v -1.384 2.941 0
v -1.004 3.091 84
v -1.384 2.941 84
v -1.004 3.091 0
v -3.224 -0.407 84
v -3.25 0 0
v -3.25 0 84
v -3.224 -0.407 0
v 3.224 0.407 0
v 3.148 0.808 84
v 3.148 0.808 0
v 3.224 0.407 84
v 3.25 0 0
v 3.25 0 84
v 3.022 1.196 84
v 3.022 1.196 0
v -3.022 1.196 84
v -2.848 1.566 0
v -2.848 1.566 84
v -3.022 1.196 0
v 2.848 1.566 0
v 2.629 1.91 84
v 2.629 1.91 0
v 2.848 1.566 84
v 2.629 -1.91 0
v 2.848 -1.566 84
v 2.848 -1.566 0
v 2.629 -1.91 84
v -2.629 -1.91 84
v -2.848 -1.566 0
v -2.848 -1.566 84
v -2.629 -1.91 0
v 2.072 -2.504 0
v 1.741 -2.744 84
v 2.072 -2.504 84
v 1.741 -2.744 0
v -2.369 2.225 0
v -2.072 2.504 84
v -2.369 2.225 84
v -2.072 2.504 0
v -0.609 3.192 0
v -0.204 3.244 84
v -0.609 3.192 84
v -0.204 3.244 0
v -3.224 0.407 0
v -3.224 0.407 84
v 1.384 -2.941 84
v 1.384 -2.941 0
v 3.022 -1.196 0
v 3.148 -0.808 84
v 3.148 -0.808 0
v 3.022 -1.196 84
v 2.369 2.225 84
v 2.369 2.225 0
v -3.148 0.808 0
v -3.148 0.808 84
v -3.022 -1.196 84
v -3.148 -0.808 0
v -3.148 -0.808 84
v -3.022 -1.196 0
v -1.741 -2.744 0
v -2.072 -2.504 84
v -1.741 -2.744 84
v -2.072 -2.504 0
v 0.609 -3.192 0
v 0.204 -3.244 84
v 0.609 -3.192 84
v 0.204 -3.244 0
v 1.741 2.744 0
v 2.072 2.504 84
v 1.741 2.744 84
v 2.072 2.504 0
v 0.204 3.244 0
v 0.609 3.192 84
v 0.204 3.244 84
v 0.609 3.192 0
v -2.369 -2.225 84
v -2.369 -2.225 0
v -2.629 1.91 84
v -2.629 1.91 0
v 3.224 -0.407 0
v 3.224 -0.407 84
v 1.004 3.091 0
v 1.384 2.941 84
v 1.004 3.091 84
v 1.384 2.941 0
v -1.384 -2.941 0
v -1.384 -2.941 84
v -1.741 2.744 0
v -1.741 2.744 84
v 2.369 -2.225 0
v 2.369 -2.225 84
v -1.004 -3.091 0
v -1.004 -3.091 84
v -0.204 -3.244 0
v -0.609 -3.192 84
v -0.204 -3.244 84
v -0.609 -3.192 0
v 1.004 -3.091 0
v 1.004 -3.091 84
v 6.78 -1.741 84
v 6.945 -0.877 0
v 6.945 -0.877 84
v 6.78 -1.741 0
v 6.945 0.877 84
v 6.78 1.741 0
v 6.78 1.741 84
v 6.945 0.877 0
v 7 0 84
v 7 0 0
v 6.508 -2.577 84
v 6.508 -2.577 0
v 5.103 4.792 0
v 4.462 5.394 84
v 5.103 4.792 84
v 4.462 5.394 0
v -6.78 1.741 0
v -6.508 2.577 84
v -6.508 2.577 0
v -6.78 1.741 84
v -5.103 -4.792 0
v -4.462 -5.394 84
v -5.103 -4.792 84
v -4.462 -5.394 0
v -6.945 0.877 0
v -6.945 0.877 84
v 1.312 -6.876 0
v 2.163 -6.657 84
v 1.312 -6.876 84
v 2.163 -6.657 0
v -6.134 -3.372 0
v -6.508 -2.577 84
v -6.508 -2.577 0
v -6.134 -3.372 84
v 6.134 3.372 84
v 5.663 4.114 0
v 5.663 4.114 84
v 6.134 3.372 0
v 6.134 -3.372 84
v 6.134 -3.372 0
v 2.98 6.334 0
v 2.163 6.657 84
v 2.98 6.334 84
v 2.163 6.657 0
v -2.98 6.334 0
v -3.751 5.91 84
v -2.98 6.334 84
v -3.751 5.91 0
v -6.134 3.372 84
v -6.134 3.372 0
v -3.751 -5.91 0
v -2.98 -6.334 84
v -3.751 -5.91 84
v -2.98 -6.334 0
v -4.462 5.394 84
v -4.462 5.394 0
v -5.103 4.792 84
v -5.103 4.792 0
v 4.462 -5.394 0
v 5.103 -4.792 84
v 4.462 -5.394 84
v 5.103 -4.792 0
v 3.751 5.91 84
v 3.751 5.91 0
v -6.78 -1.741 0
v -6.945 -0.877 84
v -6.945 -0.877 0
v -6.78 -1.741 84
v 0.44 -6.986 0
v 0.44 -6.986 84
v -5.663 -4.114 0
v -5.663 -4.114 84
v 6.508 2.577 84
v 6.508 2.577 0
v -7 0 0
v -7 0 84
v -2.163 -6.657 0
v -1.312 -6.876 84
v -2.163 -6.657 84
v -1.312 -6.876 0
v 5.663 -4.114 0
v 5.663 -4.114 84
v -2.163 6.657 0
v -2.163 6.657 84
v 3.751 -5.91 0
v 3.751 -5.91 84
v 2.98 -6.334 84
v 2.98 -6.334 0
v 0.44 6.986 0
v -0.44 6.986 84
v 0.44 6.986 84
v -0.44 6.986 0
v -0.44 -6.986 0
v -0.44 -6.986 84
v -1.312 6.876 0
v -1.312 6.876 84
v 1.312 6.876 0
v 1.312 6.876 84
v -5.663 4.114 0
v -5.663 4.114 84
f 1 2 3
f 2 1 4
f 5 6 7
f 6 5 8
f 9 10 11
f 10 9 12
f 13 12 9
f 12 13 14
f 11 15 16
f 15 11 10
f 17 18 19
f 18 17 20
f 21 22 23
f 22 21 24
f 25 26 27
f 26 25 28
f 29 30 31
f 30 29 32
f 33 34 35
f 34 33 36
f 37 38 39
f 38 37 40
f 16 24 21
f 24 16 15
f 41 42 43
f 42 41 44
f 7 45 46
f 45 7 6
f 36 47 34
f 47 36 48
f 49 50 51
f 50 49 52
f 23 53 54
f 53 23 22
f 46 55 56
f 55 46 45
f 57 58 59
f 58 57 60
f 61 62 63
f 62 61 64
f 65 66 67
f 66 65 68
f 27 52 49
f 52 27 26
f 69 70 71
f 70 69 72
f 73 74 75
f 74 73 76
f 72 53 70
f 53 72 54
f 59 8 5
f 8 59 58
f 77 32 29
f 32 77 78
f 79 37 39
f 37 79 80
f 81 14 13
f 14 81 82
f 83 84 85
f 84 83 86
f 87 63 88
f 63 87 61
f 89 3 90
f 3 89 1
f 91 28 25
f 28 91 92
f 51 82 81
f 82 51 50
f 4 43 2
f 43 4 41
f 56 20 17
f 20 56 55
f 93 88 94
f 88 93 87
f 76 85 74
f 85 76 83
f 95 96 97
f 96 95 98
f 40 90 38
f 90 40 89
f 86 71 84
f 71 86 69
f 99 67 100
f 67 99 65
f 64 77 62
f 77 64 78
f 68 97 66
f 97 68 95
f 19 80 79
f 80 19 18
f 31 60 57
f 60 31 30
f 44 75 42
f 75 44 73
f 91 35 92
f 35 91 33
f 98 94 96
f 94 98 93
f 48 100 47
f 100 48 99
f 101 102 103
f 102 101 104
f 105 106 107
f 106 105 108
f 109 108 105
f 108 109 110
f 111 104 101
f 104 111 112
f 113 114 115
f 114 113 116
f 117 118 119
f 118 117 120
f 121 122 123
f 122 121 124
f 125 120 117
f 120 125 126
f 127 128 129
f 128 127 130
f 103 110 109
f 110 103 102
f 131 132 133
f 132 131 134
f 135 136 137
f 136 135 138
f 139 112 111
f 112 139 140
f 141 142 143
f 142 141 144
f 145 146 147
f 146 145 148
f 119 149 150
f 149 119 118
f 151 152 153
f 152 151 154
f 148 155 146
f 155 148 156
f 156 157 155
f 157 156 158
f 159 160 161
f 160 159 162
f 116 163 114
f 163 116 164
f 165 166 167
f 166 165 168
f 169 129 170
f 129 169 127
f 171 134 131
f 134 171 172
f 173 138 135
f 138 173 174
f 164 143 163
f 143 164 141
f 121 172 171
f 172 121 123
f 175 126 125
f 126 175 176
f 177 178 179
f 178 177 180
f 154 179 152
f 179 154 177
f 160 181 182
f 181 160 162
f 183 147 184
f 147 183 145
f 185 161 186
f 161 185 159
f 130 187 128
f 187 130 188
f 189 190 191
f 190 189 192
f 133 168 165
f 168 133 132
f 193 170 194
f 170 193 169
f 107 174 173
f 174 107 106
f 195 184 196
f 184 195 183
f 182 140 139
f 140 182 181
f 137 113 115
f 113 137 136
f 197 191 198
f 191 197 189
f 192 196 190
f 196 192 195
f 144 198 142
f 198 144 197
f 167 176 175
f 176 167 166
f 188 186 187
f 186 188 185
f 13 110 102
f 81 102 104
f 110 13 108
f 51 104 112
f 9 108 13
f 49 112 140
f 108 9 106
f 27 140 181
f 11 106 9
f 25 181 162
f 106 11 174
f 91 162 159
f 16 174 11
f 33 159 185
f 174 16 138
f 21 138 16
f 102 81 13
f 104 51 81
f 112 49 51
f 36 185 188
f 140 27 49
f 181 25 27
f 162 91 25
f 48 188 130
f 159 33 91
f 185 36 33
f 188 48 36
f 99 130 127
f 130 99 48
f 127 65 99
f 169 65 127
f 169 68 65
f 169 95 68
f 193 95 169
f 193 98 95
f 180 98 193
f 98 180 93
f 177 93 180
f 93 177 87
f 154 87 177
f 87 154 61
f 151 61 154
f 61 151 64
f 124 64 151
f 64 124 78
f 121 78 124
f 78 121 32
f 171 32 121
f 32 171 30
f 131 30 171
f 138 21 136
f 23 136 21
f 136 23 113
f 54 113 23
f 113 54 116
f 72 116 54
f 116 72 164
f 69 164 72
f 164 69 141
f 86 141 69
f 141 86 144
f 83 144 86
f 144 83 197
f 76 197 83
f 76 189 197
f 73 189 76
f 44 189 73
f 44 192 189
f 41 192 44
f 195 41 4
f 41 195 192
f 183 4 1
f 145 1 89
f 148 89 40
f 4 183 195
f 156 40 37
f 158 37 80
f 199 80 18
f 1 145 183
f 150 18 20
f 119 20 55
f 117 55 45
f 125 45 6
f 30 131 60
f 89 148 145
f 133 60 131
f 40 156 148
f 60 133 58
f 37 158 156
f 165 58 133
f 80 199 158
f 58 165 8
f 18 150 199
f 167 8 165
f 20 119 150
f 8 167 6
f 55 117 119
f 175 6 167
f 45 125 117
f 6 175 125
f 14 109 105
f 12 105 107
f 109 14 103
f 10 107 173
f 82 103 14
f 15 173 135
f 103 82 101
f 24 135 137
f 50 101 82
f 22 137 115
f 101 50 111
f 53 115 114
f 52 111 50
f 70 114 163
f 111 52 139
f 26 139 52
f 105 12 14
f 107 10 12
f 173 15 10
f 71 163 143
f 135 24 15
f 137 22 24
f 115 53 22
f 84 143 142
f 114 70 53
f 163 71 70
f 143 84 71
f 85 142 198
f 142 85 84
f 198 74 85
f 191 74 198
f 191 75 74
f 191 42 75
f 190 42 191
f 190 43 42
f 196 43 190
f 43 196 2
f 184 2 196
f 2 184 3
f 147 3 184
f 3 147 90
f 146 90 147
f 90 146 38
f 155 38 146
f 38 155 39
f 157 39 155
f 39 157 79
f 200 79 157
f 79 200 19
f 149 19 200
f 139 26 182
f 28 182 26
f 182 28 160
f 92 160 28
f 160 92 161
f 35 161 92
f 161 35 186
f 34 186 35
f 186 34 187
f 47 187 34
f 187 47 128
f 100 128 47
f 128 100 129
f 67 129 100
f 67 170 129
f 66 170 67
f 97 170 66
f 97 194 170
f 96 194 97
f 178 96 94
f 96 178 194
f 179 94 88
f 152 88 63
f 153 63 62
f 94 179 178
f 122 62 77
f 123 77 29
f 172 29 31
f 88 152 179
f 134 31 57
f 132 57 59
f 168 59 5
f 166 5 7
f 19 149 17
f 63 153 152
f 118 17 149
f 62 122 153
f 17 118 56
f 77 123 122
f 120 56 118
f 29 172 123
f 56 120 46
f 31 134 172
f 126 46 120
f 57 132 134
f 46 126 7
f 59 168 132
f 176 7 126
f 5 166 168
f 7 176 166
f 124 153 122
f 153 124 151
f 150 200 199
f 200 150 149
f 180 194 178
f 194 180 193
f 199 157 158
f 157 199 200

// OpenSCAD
$fn = 50;


difference() {
	union() {
		*color(alpha = 1.0000000000, c = "gray") {
			translate(v = [0, 7, 0]) {
				linear_extrude(height = 1) {
					text(font = "Arial:style=Bold", halign = "center", size = 4.5000000000, text = "COMMENT plate main", valign = "center");
				}
			}
		}
		cylinder(h = 84, r = 7.0000000000);
	}
	union() {
		*color(alpha = 1.0000000000, c = "gray") {
			translate(v = [0, 7, 0]) {
				linear_extrude(height = 1) {
					text(font = "Arial:style=Bold", halign = "center", size = 4.5000000000, text = "COMMENT holes main", valign = "center");
				}
			}
		}
		translate(v = [0, 0, -100]) {
			cylinder(h = 200, r = 3.2500000000);
		}
		translate(v = [0, 0, -100]) {
			cylinder(h = 200, r = 1.8000000000);
		}
	}
}
